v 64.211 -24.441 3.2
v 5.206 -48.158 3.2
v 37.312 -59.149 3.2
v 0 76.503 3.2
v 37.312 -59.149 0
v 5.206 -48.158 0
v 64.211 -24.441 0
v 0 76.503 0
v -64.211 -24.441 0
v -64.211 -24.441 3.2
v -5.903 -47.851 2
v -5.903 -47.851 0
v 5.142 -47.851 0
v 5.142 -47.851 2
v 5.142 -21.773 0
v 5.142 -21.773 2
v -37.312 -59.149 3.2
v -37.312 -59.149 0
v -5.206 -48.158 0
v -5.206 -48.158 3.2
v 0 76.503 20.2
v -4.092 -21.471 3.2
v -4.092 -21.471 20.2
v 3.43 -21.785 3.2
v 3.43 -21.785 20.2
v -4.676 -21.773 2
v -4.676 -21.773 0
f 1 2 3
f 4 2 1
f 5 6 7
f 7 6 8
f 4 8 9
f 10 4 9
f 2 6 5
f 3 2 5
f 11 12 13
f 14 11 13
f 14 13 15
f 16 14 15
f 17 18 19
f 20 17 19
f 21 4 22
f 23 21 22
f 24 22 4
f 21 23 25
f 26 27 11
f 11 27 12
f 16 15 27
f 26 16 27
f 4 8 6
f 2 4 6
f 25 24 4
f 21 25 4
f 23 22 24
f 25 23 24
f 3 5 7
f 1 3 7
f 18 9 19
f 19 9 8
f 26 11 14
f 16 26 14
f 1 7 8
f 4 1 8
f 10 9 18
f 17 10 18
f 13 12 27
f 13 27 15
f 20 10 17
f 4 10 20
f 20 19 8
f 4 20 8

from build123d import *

# Parameters (mm, degrees)
F1_DEPTH = 3.2
F3_DEPTH = 17
F5_DEPTH = 2


with BuildPart() as f1:
    # F0 (on Top) → F1 (new body)
    with BuildSketch(Plane.XY):
        Polygon((-5.206286, -48.158143), (0, 76.503493), (-64.210862, -24.440616), (-37.311718, -59.149191), align=None)
        Polygon((64.210862, -24.440616), (0, 76.503493), (5.206286, -48.158143), (37.311718, -59.149191), align=None)
    extrude(amount=F1_DEPTH)


with BuildPart() as f3:
    # F2 (on face) → F3 (new body)
    with BuildSketch(Plane.XY.offset(3.2)):
        Polygon((3.430172, -21.785341), (0, 76.503493), (-4.091751, -21.471201), align=None)
    extrude(amount=F3_DEPTH)


with BuildPart() as f5:
    # F4 (on Top) → F5 (new body)
    with BuildSketch(Plane.XY):
        Polygon((-4.67599, -21.772821), (-5.903192, -47.850896), (5.14164, -47.850896), (5.14164, -21.772821), align=None)
    extrude(amount=F5_DEPTH)


solid = Compound([f1.part, f3.part, f5.part])
